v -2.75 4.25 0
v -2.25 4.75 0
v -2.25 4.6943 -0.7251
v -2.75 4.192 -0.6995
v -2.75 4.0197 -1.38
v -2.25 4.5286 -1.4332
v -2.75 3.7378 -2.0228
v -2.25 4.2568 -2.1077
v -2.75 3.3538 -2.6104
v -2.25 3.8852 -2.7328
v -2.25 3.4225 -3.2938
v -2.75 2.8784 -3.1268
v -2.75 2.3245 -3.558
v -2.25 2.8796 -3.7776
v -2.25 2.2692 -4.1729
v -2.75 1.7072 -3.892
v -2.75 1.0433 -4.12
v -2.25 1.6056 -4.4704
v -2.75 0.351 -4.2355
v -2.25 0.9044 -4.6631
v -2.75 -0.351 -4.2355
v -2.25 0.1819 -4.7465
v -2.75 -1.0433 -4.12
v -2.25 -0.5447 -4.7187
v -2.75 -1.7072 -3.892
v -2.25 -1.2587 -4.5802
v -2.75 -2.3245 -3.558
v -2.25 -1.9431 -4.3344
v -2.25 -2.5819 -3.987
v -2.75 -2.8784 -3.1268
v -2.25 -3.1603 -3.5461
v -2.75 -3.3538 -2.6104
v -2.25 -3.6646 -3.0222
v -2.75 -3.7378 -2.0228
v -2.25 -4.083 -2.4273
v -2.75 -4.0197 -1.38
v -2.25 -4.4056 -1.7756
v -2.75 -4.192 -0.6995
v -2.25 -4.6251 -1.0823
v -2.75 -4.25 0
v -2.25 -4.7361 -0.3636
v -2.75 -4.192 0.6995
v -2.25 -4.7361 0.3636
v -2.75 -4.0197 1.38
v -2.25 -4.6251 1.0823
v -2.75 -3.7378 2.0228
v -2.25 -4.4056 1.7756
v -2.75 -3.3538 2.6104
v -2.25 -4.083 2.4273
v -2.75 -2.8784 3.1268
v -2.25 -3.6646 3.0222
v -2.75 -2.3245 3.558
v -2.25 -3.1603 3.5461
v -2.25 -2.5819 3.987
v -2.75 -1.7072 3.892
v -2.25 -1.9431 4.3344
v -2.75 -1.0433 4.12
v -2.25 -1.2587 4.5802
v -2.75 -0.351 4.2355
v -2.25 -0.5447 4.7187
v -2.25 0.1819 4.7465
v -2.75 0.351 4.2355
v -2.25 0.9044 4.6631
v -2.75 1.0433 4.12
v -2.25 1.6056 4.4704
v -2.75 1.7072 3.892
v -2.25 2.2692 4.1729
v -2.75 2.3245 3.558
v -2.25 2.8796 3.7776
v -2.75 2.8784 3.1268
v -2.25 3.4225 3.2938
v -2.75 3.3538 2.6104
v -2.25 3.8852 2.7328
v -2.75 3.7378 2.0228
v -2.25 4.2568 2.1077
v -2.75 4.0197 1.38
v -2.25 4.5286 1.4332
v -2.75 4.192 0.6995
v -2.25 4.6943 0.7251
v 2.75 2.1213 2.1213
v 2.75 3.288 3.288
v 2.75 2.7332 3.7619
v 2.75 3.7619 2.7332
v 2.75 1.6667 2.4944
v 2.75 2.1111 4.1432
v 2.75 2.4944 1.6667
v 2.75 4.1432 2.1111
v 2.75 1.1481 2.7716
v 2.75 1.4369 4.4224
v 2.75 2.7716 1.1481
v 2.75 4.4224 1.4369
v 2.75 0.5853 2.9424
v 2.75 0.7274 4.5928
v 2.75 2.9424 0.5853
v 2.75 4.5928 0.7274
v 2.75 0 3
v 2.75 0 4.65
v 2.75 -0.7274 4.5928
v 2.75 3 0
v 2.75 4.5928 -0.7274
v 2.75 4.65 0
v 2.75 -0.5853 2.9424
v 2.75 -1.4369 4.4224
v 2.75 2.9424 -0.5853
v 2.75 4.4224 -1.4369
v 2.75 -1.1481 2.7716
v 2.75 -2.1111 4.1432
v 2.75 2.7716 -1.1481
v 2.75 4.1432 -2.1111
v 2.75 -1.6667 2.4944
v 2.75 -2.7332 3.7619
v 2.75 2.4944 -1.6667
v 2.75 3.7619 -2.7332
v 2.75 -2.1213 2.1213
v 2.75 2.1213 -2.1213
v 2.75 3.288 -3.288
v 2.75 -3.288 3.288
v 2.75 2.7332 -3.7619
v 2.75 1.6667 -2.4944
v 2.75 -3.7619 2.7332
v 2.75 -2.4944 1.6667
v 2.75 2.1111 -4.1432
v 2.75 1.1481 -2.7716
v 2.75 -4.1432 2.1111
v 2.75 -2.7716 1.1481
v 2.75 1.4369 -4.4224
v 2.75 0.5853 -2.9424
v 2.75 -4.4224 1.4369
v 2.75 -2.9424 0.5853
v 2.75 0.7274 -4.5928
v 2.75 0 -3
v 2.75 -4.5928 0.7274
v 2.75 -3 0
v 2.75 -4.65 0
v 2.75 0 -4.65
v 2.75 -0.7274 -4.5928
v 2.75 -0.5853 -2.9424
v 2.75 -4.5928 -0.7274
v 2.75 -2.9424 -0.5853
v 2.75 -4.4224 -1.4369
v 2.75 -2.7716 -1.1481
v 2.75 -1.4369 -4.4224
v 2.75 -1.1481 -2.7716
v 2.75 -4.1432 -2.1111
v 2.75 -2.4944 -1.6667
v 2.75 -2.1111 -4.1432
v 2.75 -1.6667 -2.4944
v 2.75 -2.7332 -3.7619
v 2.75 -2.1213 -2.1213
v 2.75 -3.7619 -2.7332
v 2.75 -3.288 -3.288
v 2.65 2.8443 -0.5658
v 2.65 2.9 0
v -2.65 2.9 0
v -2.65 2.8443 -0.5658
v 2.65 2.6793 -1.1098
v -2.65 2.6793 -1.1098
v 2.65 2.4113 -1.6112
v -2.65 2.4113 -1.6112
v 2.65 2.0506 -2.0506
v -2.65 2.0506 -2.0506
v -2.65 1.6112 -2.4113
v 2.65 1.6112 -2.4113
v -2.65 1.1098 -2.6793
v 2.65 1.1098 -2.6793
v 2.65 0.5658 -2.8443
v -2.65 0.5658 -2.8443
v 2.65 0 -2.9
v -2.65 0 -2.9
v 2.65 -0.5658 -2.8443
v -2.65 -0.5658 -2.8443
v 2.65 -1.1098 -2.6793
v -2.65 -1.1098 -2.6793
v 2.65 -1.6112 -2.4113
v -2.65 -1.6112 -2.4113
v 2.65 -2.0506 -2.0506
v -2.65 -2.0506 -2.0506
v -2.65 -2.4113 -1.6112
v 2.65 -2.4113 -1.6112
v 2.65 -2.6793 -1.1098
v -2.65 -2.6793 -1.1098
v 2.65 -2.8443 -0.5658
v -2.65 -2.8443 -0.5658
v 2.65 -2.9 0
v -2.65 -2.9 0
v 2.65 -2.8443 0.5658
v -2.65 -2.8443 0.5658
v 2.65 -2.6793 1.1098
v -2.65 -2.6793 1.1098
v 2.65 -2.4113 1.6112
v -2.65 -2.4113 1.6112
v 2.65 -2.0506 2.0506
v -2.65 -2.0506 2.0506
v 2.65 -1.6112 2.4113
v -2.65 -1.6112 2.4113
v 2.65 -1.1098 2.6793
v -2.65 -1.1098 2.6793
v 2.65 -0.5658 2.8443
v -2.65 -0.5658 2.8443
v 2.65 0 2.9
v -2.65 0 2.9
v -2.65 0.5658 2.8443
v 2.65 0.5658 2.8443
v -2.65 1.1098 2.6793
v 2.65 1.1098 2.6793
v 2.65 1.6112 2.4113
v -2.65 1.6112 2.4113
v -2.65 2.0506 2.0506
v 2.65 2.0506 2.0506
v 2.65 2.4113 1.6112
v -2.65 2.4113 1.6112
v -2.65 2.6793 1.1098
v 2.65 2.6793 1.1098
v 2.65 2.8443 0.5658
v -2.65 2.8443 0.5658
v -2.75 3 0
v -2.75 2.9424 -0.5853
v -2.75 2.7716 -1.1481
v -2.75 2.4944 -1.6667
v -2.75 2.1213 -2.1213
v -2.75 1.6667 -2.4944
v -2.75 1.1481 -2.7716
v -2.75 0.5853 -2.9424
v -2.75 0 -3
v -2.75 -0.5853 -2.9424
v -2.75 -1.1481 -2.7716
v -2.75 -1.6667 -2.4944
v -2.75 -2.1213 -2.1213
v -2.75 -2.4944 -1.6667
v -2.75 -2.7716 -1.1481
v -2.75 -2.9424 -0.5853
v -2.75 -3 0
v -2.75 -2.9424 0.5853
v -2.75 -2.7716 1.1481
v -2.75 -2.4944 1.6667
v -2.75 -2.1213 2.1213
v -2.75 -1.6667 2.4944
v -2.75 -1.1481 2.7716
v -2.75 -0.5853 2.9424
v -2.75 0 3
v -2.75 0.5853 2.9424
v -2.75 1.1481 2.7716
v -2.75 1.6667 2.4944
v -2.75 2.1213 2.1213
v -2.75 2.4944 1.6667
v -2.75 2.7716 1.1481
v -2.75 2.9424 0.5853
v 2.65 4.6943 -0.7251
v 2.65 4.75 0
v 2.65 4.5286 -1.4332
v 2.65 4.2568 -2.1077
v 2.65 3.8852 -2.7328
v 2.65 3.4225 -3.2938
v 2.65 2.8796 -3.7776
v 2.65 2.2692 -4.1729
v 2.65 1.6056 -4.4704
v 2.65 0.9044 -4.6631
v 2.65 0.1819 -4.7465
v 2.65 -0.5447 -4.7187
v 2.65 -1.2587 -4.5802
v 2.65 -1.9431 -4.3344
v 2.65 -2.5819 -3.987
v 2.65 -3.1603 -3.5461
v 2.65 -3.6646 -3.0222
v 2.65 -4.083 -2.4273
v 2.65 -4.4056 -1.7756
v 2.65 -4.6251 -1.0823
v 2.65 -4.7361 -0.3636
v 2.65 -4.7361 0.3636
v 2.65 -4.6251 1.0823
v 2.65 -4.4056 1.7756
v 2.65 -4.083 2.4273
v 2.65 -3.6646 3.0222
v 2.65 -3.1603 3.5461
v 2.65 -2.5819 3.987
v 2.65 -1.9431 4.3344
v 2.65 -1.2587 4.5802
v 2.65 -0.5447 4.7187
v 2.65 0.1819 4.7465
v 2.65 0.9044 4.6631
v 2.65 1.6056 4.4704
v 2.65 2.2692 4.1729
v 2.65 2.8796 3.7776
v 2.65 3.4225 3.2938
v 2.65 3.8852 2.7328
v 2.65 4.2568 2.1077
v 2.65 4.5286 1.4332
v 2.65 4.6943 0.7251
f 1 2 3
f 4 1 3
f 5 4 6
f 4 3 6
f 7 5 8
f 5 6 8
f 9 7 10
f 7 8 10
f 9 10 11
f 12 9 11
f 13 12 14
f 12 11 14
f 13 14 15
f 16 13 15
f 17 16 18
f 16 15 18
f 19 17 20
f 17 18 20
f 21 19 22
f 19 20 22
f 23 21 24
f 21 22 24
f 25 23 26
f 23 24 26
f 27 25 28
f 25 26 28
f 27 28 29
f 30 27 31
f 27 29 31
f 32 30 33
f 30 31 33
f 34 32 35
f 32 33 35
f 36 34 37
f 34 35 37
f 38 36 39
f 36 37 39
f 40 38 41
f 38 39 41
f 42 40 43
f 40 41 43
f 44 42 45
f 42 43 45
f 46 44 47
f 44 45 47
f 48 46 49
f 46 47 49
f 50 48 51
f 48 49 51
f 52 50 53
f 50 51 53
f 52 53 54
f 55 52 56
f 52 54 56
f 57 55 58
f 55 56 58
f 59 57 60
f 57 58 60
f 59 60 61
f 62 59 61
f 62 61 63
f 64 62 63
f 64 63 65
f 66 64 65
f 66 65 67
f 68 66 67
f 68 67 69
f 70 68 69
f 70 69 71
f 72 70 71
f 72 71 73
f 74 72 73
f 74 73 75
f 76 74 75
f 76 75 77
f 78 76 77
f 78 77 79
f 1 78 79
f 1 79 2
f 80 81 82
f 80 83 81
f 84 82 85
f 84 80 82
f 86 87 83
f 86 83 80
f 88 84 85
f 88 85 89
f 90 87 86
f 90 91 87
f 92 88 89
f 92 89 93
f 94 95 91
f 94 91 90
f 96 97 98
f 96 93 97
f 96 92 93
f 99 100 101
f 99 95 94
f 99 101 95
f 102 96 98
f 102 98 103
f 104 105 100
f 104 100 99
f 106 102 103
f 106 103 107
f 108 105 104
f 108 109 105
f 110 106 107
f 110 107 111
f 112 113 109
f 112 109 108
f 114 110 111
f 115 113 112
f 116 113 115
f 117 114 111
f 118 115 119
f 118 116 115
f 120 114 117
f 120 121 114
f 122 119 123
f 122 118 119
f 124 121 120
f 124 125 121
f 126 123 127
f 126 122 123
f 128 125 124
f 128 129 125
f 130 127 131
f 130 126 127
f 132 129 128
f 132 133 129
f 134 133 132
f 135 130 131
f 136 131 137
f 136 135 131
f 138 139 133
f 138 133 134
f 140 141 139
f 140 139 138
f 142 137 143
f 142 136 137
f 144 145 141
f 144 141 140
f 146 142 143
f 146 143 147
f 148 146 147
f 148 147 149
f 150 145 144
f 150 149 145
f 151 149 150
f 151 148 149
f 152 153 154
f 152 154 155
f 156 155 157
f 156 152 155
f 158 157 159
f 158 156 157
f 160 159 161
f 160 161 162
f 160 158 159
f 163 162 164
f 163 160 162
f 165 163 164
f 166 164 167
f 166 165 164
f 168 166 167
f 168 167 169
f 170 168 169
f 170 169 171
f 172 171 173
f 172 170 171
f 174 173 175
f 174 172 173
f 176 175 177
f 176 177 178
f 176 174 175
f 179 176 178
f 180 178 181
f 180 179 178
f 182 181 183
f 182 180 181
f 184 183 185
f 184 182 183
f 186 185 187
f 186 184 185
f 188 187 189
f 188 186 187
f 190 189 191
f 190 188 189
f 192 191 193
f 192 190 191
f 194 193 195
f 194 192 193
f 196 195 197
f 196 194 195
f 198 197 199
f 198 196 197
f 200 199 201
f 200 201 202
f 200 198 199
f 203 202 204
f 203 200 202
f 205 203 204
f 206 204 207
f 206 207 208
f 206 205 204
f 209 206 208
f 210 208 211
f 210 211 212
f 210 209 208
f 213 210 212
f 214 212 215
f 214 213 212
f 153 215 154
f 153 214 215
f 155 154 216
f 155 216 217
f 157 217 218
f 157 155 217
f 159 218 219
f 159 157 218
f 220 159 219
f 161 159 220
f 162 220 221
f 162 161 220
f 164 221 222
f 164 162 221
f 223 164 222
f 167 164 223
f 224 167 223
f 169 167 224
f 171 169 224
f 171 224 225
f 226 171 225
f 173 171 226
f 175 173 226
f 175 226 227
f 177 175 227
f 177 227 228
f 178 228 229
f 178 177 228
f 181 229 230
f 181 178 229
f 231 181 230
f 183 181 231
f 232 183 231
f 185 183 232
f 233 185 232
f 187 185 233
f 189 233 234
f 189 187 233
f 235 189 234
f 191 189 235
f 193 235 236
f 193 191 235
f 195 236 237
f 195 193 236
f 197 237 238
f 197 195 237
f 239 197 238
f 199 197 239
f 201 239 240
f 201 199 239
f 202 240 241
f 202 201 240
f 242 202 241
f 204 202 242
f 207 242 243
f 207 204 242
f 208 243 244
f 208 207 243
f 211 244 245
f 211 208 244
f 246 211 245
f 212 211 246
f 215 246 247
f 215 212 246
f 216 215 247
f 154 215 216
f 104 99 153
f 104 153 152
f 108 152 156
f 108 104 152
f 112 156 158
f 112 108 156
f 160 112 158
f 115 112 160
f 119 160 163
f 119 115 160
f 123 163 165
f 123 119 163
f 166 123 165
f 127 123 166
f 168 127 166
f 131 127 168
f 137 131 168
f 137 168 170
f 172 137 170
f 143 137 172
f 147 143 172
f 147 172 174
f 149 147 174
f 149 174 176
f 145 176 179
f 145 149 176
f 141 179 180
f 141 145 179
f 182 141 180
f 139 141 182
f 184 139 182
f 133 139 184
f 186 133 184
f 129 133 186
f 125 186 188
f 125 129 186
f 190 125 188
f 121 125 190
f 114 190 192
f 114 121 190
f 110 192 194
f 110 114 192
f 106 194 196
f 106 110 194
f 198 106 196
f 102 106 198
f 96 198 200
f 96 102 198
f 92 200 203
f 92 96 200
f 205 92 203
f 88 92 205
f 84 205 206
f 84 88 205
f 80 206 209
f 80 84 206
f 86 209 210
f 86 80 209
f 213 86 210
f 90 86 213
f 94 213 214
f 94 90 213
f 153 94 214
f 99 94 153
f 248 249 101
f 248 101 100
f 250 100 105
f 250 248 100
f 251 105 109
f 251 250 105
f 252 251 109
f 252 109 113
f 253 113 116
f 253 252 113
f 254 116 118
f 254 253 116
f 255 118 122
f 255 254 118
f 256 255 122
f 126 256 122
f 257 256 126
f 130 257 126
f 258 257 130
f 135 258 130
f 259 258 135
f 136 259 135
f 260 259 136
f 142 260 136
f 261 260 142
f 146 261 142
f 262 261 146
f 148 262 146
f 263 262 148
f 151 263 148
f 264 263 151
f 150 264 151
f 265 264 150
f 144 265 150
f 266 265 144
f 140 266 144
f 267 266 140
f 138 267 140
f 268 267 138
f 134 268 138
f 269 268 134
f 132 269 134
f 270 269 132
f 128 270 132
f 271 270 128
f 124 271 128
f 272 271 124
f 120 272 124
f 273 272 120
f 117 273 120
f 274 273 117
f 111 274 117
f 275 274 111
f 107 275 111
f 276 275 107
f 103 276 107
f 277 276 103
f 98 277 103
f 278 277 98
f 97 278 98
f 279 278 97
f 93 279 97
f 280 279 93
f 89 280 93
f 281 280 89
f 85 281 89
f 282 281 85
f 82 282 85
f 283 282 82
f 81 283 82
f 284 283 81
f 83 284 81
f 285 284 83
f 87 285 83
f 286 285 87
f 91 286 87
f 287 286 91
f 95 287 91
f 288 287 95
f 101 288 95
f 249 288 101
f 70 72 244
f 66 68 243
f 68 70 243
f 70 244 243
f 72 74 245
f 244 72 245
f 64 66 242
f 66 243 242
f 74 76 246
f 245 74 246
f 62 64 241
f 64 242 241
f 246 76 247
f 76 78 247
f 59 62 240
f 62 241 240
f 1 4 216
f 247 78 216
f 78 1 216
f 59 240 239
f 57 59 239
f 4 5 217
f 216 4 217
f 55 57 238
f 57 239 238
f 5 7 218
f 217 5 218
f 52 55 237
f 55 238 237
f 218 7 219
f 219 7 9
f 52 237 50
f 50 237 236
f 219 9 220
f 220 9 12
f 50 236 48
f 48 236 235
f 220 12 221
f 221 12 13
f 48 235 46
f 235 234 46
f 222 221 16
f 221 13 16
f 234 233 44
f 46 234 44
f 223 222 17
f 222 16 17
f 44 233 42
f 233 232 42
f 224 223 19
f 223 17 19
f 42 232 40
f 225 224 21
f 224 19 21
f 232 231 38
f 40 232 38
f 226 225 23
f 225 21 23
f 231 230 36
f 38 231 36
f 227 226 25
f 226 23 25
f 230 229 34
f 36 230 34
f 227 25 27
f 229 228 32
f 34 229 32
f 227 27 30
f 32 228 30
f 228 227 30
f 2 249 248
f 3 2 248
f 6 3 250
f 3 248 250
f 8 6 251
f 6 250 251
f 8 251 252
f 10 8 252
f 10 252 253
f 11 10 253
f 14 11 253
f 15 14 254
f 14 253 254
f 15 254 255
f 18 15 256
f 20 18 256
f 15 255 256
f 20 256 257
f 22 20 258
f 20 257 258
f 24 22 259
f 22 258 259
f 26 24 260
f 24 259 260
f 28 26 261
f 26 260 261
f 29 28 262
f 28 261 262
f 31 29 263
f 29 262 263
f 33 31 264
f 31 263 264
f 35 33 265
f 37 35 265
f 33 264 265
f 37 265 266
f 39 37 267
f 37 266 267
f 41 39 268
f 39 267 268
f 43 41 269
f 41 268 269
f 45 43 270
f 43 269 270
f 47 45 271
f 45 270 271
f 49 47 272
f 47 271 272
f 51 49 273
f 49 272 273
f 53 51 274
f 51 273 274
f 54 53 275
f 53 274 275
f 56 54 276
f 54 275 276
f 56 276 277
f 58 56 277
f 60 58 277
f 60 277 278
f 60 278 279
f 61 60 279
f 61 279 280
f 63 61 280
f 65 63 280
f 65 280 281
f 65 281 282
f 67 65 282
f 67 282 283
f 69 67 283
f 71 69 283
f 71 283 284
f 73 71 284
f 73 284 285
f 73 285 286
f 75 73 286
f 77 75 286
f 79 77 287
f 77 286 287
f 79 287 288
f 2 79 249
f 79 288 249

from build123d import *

# Parameters (mm, degrees)
ESQUISSE1_W     = 5.5
ESQUISSE1_H     = 1.85
CHANFREIN1_SIZE = 0.1
CHANFREIN2_SIZE = 0.5


with BuildPart() as part:
    # Esquisse1 → Révolution1 (revolve)
    with BuildSketch(Plane.XY):
        with Locations((0, 3.825)):
            Rectangle(ESQUISSE1_W, ESQUISSE1_H)
    revolve(axis=Axis((0, 0, 0), (-1, 0, 0)))

    # Chanfrein1
    chanfrein1_edges = [part.edges().sort_by_distance(p)[0] for p in [
        (2.75, -2.9, 0),
        (-2.75, -2.9, 0),
        (2.75, -4.75, 0),
    ]]
    chamfer(chanfrein1_edges, length=CHANFREIN1_SIZE)

    # Chanfrein2
    chanfrein2_edges = [part.edges().sort_by_distance(p)[0] for p in [
        (-2.75, -4.75, 0),
    ]]
    chamfer(chanfrein2_edges, length=CHANFREIN2_SIZE)


solid = part.part
